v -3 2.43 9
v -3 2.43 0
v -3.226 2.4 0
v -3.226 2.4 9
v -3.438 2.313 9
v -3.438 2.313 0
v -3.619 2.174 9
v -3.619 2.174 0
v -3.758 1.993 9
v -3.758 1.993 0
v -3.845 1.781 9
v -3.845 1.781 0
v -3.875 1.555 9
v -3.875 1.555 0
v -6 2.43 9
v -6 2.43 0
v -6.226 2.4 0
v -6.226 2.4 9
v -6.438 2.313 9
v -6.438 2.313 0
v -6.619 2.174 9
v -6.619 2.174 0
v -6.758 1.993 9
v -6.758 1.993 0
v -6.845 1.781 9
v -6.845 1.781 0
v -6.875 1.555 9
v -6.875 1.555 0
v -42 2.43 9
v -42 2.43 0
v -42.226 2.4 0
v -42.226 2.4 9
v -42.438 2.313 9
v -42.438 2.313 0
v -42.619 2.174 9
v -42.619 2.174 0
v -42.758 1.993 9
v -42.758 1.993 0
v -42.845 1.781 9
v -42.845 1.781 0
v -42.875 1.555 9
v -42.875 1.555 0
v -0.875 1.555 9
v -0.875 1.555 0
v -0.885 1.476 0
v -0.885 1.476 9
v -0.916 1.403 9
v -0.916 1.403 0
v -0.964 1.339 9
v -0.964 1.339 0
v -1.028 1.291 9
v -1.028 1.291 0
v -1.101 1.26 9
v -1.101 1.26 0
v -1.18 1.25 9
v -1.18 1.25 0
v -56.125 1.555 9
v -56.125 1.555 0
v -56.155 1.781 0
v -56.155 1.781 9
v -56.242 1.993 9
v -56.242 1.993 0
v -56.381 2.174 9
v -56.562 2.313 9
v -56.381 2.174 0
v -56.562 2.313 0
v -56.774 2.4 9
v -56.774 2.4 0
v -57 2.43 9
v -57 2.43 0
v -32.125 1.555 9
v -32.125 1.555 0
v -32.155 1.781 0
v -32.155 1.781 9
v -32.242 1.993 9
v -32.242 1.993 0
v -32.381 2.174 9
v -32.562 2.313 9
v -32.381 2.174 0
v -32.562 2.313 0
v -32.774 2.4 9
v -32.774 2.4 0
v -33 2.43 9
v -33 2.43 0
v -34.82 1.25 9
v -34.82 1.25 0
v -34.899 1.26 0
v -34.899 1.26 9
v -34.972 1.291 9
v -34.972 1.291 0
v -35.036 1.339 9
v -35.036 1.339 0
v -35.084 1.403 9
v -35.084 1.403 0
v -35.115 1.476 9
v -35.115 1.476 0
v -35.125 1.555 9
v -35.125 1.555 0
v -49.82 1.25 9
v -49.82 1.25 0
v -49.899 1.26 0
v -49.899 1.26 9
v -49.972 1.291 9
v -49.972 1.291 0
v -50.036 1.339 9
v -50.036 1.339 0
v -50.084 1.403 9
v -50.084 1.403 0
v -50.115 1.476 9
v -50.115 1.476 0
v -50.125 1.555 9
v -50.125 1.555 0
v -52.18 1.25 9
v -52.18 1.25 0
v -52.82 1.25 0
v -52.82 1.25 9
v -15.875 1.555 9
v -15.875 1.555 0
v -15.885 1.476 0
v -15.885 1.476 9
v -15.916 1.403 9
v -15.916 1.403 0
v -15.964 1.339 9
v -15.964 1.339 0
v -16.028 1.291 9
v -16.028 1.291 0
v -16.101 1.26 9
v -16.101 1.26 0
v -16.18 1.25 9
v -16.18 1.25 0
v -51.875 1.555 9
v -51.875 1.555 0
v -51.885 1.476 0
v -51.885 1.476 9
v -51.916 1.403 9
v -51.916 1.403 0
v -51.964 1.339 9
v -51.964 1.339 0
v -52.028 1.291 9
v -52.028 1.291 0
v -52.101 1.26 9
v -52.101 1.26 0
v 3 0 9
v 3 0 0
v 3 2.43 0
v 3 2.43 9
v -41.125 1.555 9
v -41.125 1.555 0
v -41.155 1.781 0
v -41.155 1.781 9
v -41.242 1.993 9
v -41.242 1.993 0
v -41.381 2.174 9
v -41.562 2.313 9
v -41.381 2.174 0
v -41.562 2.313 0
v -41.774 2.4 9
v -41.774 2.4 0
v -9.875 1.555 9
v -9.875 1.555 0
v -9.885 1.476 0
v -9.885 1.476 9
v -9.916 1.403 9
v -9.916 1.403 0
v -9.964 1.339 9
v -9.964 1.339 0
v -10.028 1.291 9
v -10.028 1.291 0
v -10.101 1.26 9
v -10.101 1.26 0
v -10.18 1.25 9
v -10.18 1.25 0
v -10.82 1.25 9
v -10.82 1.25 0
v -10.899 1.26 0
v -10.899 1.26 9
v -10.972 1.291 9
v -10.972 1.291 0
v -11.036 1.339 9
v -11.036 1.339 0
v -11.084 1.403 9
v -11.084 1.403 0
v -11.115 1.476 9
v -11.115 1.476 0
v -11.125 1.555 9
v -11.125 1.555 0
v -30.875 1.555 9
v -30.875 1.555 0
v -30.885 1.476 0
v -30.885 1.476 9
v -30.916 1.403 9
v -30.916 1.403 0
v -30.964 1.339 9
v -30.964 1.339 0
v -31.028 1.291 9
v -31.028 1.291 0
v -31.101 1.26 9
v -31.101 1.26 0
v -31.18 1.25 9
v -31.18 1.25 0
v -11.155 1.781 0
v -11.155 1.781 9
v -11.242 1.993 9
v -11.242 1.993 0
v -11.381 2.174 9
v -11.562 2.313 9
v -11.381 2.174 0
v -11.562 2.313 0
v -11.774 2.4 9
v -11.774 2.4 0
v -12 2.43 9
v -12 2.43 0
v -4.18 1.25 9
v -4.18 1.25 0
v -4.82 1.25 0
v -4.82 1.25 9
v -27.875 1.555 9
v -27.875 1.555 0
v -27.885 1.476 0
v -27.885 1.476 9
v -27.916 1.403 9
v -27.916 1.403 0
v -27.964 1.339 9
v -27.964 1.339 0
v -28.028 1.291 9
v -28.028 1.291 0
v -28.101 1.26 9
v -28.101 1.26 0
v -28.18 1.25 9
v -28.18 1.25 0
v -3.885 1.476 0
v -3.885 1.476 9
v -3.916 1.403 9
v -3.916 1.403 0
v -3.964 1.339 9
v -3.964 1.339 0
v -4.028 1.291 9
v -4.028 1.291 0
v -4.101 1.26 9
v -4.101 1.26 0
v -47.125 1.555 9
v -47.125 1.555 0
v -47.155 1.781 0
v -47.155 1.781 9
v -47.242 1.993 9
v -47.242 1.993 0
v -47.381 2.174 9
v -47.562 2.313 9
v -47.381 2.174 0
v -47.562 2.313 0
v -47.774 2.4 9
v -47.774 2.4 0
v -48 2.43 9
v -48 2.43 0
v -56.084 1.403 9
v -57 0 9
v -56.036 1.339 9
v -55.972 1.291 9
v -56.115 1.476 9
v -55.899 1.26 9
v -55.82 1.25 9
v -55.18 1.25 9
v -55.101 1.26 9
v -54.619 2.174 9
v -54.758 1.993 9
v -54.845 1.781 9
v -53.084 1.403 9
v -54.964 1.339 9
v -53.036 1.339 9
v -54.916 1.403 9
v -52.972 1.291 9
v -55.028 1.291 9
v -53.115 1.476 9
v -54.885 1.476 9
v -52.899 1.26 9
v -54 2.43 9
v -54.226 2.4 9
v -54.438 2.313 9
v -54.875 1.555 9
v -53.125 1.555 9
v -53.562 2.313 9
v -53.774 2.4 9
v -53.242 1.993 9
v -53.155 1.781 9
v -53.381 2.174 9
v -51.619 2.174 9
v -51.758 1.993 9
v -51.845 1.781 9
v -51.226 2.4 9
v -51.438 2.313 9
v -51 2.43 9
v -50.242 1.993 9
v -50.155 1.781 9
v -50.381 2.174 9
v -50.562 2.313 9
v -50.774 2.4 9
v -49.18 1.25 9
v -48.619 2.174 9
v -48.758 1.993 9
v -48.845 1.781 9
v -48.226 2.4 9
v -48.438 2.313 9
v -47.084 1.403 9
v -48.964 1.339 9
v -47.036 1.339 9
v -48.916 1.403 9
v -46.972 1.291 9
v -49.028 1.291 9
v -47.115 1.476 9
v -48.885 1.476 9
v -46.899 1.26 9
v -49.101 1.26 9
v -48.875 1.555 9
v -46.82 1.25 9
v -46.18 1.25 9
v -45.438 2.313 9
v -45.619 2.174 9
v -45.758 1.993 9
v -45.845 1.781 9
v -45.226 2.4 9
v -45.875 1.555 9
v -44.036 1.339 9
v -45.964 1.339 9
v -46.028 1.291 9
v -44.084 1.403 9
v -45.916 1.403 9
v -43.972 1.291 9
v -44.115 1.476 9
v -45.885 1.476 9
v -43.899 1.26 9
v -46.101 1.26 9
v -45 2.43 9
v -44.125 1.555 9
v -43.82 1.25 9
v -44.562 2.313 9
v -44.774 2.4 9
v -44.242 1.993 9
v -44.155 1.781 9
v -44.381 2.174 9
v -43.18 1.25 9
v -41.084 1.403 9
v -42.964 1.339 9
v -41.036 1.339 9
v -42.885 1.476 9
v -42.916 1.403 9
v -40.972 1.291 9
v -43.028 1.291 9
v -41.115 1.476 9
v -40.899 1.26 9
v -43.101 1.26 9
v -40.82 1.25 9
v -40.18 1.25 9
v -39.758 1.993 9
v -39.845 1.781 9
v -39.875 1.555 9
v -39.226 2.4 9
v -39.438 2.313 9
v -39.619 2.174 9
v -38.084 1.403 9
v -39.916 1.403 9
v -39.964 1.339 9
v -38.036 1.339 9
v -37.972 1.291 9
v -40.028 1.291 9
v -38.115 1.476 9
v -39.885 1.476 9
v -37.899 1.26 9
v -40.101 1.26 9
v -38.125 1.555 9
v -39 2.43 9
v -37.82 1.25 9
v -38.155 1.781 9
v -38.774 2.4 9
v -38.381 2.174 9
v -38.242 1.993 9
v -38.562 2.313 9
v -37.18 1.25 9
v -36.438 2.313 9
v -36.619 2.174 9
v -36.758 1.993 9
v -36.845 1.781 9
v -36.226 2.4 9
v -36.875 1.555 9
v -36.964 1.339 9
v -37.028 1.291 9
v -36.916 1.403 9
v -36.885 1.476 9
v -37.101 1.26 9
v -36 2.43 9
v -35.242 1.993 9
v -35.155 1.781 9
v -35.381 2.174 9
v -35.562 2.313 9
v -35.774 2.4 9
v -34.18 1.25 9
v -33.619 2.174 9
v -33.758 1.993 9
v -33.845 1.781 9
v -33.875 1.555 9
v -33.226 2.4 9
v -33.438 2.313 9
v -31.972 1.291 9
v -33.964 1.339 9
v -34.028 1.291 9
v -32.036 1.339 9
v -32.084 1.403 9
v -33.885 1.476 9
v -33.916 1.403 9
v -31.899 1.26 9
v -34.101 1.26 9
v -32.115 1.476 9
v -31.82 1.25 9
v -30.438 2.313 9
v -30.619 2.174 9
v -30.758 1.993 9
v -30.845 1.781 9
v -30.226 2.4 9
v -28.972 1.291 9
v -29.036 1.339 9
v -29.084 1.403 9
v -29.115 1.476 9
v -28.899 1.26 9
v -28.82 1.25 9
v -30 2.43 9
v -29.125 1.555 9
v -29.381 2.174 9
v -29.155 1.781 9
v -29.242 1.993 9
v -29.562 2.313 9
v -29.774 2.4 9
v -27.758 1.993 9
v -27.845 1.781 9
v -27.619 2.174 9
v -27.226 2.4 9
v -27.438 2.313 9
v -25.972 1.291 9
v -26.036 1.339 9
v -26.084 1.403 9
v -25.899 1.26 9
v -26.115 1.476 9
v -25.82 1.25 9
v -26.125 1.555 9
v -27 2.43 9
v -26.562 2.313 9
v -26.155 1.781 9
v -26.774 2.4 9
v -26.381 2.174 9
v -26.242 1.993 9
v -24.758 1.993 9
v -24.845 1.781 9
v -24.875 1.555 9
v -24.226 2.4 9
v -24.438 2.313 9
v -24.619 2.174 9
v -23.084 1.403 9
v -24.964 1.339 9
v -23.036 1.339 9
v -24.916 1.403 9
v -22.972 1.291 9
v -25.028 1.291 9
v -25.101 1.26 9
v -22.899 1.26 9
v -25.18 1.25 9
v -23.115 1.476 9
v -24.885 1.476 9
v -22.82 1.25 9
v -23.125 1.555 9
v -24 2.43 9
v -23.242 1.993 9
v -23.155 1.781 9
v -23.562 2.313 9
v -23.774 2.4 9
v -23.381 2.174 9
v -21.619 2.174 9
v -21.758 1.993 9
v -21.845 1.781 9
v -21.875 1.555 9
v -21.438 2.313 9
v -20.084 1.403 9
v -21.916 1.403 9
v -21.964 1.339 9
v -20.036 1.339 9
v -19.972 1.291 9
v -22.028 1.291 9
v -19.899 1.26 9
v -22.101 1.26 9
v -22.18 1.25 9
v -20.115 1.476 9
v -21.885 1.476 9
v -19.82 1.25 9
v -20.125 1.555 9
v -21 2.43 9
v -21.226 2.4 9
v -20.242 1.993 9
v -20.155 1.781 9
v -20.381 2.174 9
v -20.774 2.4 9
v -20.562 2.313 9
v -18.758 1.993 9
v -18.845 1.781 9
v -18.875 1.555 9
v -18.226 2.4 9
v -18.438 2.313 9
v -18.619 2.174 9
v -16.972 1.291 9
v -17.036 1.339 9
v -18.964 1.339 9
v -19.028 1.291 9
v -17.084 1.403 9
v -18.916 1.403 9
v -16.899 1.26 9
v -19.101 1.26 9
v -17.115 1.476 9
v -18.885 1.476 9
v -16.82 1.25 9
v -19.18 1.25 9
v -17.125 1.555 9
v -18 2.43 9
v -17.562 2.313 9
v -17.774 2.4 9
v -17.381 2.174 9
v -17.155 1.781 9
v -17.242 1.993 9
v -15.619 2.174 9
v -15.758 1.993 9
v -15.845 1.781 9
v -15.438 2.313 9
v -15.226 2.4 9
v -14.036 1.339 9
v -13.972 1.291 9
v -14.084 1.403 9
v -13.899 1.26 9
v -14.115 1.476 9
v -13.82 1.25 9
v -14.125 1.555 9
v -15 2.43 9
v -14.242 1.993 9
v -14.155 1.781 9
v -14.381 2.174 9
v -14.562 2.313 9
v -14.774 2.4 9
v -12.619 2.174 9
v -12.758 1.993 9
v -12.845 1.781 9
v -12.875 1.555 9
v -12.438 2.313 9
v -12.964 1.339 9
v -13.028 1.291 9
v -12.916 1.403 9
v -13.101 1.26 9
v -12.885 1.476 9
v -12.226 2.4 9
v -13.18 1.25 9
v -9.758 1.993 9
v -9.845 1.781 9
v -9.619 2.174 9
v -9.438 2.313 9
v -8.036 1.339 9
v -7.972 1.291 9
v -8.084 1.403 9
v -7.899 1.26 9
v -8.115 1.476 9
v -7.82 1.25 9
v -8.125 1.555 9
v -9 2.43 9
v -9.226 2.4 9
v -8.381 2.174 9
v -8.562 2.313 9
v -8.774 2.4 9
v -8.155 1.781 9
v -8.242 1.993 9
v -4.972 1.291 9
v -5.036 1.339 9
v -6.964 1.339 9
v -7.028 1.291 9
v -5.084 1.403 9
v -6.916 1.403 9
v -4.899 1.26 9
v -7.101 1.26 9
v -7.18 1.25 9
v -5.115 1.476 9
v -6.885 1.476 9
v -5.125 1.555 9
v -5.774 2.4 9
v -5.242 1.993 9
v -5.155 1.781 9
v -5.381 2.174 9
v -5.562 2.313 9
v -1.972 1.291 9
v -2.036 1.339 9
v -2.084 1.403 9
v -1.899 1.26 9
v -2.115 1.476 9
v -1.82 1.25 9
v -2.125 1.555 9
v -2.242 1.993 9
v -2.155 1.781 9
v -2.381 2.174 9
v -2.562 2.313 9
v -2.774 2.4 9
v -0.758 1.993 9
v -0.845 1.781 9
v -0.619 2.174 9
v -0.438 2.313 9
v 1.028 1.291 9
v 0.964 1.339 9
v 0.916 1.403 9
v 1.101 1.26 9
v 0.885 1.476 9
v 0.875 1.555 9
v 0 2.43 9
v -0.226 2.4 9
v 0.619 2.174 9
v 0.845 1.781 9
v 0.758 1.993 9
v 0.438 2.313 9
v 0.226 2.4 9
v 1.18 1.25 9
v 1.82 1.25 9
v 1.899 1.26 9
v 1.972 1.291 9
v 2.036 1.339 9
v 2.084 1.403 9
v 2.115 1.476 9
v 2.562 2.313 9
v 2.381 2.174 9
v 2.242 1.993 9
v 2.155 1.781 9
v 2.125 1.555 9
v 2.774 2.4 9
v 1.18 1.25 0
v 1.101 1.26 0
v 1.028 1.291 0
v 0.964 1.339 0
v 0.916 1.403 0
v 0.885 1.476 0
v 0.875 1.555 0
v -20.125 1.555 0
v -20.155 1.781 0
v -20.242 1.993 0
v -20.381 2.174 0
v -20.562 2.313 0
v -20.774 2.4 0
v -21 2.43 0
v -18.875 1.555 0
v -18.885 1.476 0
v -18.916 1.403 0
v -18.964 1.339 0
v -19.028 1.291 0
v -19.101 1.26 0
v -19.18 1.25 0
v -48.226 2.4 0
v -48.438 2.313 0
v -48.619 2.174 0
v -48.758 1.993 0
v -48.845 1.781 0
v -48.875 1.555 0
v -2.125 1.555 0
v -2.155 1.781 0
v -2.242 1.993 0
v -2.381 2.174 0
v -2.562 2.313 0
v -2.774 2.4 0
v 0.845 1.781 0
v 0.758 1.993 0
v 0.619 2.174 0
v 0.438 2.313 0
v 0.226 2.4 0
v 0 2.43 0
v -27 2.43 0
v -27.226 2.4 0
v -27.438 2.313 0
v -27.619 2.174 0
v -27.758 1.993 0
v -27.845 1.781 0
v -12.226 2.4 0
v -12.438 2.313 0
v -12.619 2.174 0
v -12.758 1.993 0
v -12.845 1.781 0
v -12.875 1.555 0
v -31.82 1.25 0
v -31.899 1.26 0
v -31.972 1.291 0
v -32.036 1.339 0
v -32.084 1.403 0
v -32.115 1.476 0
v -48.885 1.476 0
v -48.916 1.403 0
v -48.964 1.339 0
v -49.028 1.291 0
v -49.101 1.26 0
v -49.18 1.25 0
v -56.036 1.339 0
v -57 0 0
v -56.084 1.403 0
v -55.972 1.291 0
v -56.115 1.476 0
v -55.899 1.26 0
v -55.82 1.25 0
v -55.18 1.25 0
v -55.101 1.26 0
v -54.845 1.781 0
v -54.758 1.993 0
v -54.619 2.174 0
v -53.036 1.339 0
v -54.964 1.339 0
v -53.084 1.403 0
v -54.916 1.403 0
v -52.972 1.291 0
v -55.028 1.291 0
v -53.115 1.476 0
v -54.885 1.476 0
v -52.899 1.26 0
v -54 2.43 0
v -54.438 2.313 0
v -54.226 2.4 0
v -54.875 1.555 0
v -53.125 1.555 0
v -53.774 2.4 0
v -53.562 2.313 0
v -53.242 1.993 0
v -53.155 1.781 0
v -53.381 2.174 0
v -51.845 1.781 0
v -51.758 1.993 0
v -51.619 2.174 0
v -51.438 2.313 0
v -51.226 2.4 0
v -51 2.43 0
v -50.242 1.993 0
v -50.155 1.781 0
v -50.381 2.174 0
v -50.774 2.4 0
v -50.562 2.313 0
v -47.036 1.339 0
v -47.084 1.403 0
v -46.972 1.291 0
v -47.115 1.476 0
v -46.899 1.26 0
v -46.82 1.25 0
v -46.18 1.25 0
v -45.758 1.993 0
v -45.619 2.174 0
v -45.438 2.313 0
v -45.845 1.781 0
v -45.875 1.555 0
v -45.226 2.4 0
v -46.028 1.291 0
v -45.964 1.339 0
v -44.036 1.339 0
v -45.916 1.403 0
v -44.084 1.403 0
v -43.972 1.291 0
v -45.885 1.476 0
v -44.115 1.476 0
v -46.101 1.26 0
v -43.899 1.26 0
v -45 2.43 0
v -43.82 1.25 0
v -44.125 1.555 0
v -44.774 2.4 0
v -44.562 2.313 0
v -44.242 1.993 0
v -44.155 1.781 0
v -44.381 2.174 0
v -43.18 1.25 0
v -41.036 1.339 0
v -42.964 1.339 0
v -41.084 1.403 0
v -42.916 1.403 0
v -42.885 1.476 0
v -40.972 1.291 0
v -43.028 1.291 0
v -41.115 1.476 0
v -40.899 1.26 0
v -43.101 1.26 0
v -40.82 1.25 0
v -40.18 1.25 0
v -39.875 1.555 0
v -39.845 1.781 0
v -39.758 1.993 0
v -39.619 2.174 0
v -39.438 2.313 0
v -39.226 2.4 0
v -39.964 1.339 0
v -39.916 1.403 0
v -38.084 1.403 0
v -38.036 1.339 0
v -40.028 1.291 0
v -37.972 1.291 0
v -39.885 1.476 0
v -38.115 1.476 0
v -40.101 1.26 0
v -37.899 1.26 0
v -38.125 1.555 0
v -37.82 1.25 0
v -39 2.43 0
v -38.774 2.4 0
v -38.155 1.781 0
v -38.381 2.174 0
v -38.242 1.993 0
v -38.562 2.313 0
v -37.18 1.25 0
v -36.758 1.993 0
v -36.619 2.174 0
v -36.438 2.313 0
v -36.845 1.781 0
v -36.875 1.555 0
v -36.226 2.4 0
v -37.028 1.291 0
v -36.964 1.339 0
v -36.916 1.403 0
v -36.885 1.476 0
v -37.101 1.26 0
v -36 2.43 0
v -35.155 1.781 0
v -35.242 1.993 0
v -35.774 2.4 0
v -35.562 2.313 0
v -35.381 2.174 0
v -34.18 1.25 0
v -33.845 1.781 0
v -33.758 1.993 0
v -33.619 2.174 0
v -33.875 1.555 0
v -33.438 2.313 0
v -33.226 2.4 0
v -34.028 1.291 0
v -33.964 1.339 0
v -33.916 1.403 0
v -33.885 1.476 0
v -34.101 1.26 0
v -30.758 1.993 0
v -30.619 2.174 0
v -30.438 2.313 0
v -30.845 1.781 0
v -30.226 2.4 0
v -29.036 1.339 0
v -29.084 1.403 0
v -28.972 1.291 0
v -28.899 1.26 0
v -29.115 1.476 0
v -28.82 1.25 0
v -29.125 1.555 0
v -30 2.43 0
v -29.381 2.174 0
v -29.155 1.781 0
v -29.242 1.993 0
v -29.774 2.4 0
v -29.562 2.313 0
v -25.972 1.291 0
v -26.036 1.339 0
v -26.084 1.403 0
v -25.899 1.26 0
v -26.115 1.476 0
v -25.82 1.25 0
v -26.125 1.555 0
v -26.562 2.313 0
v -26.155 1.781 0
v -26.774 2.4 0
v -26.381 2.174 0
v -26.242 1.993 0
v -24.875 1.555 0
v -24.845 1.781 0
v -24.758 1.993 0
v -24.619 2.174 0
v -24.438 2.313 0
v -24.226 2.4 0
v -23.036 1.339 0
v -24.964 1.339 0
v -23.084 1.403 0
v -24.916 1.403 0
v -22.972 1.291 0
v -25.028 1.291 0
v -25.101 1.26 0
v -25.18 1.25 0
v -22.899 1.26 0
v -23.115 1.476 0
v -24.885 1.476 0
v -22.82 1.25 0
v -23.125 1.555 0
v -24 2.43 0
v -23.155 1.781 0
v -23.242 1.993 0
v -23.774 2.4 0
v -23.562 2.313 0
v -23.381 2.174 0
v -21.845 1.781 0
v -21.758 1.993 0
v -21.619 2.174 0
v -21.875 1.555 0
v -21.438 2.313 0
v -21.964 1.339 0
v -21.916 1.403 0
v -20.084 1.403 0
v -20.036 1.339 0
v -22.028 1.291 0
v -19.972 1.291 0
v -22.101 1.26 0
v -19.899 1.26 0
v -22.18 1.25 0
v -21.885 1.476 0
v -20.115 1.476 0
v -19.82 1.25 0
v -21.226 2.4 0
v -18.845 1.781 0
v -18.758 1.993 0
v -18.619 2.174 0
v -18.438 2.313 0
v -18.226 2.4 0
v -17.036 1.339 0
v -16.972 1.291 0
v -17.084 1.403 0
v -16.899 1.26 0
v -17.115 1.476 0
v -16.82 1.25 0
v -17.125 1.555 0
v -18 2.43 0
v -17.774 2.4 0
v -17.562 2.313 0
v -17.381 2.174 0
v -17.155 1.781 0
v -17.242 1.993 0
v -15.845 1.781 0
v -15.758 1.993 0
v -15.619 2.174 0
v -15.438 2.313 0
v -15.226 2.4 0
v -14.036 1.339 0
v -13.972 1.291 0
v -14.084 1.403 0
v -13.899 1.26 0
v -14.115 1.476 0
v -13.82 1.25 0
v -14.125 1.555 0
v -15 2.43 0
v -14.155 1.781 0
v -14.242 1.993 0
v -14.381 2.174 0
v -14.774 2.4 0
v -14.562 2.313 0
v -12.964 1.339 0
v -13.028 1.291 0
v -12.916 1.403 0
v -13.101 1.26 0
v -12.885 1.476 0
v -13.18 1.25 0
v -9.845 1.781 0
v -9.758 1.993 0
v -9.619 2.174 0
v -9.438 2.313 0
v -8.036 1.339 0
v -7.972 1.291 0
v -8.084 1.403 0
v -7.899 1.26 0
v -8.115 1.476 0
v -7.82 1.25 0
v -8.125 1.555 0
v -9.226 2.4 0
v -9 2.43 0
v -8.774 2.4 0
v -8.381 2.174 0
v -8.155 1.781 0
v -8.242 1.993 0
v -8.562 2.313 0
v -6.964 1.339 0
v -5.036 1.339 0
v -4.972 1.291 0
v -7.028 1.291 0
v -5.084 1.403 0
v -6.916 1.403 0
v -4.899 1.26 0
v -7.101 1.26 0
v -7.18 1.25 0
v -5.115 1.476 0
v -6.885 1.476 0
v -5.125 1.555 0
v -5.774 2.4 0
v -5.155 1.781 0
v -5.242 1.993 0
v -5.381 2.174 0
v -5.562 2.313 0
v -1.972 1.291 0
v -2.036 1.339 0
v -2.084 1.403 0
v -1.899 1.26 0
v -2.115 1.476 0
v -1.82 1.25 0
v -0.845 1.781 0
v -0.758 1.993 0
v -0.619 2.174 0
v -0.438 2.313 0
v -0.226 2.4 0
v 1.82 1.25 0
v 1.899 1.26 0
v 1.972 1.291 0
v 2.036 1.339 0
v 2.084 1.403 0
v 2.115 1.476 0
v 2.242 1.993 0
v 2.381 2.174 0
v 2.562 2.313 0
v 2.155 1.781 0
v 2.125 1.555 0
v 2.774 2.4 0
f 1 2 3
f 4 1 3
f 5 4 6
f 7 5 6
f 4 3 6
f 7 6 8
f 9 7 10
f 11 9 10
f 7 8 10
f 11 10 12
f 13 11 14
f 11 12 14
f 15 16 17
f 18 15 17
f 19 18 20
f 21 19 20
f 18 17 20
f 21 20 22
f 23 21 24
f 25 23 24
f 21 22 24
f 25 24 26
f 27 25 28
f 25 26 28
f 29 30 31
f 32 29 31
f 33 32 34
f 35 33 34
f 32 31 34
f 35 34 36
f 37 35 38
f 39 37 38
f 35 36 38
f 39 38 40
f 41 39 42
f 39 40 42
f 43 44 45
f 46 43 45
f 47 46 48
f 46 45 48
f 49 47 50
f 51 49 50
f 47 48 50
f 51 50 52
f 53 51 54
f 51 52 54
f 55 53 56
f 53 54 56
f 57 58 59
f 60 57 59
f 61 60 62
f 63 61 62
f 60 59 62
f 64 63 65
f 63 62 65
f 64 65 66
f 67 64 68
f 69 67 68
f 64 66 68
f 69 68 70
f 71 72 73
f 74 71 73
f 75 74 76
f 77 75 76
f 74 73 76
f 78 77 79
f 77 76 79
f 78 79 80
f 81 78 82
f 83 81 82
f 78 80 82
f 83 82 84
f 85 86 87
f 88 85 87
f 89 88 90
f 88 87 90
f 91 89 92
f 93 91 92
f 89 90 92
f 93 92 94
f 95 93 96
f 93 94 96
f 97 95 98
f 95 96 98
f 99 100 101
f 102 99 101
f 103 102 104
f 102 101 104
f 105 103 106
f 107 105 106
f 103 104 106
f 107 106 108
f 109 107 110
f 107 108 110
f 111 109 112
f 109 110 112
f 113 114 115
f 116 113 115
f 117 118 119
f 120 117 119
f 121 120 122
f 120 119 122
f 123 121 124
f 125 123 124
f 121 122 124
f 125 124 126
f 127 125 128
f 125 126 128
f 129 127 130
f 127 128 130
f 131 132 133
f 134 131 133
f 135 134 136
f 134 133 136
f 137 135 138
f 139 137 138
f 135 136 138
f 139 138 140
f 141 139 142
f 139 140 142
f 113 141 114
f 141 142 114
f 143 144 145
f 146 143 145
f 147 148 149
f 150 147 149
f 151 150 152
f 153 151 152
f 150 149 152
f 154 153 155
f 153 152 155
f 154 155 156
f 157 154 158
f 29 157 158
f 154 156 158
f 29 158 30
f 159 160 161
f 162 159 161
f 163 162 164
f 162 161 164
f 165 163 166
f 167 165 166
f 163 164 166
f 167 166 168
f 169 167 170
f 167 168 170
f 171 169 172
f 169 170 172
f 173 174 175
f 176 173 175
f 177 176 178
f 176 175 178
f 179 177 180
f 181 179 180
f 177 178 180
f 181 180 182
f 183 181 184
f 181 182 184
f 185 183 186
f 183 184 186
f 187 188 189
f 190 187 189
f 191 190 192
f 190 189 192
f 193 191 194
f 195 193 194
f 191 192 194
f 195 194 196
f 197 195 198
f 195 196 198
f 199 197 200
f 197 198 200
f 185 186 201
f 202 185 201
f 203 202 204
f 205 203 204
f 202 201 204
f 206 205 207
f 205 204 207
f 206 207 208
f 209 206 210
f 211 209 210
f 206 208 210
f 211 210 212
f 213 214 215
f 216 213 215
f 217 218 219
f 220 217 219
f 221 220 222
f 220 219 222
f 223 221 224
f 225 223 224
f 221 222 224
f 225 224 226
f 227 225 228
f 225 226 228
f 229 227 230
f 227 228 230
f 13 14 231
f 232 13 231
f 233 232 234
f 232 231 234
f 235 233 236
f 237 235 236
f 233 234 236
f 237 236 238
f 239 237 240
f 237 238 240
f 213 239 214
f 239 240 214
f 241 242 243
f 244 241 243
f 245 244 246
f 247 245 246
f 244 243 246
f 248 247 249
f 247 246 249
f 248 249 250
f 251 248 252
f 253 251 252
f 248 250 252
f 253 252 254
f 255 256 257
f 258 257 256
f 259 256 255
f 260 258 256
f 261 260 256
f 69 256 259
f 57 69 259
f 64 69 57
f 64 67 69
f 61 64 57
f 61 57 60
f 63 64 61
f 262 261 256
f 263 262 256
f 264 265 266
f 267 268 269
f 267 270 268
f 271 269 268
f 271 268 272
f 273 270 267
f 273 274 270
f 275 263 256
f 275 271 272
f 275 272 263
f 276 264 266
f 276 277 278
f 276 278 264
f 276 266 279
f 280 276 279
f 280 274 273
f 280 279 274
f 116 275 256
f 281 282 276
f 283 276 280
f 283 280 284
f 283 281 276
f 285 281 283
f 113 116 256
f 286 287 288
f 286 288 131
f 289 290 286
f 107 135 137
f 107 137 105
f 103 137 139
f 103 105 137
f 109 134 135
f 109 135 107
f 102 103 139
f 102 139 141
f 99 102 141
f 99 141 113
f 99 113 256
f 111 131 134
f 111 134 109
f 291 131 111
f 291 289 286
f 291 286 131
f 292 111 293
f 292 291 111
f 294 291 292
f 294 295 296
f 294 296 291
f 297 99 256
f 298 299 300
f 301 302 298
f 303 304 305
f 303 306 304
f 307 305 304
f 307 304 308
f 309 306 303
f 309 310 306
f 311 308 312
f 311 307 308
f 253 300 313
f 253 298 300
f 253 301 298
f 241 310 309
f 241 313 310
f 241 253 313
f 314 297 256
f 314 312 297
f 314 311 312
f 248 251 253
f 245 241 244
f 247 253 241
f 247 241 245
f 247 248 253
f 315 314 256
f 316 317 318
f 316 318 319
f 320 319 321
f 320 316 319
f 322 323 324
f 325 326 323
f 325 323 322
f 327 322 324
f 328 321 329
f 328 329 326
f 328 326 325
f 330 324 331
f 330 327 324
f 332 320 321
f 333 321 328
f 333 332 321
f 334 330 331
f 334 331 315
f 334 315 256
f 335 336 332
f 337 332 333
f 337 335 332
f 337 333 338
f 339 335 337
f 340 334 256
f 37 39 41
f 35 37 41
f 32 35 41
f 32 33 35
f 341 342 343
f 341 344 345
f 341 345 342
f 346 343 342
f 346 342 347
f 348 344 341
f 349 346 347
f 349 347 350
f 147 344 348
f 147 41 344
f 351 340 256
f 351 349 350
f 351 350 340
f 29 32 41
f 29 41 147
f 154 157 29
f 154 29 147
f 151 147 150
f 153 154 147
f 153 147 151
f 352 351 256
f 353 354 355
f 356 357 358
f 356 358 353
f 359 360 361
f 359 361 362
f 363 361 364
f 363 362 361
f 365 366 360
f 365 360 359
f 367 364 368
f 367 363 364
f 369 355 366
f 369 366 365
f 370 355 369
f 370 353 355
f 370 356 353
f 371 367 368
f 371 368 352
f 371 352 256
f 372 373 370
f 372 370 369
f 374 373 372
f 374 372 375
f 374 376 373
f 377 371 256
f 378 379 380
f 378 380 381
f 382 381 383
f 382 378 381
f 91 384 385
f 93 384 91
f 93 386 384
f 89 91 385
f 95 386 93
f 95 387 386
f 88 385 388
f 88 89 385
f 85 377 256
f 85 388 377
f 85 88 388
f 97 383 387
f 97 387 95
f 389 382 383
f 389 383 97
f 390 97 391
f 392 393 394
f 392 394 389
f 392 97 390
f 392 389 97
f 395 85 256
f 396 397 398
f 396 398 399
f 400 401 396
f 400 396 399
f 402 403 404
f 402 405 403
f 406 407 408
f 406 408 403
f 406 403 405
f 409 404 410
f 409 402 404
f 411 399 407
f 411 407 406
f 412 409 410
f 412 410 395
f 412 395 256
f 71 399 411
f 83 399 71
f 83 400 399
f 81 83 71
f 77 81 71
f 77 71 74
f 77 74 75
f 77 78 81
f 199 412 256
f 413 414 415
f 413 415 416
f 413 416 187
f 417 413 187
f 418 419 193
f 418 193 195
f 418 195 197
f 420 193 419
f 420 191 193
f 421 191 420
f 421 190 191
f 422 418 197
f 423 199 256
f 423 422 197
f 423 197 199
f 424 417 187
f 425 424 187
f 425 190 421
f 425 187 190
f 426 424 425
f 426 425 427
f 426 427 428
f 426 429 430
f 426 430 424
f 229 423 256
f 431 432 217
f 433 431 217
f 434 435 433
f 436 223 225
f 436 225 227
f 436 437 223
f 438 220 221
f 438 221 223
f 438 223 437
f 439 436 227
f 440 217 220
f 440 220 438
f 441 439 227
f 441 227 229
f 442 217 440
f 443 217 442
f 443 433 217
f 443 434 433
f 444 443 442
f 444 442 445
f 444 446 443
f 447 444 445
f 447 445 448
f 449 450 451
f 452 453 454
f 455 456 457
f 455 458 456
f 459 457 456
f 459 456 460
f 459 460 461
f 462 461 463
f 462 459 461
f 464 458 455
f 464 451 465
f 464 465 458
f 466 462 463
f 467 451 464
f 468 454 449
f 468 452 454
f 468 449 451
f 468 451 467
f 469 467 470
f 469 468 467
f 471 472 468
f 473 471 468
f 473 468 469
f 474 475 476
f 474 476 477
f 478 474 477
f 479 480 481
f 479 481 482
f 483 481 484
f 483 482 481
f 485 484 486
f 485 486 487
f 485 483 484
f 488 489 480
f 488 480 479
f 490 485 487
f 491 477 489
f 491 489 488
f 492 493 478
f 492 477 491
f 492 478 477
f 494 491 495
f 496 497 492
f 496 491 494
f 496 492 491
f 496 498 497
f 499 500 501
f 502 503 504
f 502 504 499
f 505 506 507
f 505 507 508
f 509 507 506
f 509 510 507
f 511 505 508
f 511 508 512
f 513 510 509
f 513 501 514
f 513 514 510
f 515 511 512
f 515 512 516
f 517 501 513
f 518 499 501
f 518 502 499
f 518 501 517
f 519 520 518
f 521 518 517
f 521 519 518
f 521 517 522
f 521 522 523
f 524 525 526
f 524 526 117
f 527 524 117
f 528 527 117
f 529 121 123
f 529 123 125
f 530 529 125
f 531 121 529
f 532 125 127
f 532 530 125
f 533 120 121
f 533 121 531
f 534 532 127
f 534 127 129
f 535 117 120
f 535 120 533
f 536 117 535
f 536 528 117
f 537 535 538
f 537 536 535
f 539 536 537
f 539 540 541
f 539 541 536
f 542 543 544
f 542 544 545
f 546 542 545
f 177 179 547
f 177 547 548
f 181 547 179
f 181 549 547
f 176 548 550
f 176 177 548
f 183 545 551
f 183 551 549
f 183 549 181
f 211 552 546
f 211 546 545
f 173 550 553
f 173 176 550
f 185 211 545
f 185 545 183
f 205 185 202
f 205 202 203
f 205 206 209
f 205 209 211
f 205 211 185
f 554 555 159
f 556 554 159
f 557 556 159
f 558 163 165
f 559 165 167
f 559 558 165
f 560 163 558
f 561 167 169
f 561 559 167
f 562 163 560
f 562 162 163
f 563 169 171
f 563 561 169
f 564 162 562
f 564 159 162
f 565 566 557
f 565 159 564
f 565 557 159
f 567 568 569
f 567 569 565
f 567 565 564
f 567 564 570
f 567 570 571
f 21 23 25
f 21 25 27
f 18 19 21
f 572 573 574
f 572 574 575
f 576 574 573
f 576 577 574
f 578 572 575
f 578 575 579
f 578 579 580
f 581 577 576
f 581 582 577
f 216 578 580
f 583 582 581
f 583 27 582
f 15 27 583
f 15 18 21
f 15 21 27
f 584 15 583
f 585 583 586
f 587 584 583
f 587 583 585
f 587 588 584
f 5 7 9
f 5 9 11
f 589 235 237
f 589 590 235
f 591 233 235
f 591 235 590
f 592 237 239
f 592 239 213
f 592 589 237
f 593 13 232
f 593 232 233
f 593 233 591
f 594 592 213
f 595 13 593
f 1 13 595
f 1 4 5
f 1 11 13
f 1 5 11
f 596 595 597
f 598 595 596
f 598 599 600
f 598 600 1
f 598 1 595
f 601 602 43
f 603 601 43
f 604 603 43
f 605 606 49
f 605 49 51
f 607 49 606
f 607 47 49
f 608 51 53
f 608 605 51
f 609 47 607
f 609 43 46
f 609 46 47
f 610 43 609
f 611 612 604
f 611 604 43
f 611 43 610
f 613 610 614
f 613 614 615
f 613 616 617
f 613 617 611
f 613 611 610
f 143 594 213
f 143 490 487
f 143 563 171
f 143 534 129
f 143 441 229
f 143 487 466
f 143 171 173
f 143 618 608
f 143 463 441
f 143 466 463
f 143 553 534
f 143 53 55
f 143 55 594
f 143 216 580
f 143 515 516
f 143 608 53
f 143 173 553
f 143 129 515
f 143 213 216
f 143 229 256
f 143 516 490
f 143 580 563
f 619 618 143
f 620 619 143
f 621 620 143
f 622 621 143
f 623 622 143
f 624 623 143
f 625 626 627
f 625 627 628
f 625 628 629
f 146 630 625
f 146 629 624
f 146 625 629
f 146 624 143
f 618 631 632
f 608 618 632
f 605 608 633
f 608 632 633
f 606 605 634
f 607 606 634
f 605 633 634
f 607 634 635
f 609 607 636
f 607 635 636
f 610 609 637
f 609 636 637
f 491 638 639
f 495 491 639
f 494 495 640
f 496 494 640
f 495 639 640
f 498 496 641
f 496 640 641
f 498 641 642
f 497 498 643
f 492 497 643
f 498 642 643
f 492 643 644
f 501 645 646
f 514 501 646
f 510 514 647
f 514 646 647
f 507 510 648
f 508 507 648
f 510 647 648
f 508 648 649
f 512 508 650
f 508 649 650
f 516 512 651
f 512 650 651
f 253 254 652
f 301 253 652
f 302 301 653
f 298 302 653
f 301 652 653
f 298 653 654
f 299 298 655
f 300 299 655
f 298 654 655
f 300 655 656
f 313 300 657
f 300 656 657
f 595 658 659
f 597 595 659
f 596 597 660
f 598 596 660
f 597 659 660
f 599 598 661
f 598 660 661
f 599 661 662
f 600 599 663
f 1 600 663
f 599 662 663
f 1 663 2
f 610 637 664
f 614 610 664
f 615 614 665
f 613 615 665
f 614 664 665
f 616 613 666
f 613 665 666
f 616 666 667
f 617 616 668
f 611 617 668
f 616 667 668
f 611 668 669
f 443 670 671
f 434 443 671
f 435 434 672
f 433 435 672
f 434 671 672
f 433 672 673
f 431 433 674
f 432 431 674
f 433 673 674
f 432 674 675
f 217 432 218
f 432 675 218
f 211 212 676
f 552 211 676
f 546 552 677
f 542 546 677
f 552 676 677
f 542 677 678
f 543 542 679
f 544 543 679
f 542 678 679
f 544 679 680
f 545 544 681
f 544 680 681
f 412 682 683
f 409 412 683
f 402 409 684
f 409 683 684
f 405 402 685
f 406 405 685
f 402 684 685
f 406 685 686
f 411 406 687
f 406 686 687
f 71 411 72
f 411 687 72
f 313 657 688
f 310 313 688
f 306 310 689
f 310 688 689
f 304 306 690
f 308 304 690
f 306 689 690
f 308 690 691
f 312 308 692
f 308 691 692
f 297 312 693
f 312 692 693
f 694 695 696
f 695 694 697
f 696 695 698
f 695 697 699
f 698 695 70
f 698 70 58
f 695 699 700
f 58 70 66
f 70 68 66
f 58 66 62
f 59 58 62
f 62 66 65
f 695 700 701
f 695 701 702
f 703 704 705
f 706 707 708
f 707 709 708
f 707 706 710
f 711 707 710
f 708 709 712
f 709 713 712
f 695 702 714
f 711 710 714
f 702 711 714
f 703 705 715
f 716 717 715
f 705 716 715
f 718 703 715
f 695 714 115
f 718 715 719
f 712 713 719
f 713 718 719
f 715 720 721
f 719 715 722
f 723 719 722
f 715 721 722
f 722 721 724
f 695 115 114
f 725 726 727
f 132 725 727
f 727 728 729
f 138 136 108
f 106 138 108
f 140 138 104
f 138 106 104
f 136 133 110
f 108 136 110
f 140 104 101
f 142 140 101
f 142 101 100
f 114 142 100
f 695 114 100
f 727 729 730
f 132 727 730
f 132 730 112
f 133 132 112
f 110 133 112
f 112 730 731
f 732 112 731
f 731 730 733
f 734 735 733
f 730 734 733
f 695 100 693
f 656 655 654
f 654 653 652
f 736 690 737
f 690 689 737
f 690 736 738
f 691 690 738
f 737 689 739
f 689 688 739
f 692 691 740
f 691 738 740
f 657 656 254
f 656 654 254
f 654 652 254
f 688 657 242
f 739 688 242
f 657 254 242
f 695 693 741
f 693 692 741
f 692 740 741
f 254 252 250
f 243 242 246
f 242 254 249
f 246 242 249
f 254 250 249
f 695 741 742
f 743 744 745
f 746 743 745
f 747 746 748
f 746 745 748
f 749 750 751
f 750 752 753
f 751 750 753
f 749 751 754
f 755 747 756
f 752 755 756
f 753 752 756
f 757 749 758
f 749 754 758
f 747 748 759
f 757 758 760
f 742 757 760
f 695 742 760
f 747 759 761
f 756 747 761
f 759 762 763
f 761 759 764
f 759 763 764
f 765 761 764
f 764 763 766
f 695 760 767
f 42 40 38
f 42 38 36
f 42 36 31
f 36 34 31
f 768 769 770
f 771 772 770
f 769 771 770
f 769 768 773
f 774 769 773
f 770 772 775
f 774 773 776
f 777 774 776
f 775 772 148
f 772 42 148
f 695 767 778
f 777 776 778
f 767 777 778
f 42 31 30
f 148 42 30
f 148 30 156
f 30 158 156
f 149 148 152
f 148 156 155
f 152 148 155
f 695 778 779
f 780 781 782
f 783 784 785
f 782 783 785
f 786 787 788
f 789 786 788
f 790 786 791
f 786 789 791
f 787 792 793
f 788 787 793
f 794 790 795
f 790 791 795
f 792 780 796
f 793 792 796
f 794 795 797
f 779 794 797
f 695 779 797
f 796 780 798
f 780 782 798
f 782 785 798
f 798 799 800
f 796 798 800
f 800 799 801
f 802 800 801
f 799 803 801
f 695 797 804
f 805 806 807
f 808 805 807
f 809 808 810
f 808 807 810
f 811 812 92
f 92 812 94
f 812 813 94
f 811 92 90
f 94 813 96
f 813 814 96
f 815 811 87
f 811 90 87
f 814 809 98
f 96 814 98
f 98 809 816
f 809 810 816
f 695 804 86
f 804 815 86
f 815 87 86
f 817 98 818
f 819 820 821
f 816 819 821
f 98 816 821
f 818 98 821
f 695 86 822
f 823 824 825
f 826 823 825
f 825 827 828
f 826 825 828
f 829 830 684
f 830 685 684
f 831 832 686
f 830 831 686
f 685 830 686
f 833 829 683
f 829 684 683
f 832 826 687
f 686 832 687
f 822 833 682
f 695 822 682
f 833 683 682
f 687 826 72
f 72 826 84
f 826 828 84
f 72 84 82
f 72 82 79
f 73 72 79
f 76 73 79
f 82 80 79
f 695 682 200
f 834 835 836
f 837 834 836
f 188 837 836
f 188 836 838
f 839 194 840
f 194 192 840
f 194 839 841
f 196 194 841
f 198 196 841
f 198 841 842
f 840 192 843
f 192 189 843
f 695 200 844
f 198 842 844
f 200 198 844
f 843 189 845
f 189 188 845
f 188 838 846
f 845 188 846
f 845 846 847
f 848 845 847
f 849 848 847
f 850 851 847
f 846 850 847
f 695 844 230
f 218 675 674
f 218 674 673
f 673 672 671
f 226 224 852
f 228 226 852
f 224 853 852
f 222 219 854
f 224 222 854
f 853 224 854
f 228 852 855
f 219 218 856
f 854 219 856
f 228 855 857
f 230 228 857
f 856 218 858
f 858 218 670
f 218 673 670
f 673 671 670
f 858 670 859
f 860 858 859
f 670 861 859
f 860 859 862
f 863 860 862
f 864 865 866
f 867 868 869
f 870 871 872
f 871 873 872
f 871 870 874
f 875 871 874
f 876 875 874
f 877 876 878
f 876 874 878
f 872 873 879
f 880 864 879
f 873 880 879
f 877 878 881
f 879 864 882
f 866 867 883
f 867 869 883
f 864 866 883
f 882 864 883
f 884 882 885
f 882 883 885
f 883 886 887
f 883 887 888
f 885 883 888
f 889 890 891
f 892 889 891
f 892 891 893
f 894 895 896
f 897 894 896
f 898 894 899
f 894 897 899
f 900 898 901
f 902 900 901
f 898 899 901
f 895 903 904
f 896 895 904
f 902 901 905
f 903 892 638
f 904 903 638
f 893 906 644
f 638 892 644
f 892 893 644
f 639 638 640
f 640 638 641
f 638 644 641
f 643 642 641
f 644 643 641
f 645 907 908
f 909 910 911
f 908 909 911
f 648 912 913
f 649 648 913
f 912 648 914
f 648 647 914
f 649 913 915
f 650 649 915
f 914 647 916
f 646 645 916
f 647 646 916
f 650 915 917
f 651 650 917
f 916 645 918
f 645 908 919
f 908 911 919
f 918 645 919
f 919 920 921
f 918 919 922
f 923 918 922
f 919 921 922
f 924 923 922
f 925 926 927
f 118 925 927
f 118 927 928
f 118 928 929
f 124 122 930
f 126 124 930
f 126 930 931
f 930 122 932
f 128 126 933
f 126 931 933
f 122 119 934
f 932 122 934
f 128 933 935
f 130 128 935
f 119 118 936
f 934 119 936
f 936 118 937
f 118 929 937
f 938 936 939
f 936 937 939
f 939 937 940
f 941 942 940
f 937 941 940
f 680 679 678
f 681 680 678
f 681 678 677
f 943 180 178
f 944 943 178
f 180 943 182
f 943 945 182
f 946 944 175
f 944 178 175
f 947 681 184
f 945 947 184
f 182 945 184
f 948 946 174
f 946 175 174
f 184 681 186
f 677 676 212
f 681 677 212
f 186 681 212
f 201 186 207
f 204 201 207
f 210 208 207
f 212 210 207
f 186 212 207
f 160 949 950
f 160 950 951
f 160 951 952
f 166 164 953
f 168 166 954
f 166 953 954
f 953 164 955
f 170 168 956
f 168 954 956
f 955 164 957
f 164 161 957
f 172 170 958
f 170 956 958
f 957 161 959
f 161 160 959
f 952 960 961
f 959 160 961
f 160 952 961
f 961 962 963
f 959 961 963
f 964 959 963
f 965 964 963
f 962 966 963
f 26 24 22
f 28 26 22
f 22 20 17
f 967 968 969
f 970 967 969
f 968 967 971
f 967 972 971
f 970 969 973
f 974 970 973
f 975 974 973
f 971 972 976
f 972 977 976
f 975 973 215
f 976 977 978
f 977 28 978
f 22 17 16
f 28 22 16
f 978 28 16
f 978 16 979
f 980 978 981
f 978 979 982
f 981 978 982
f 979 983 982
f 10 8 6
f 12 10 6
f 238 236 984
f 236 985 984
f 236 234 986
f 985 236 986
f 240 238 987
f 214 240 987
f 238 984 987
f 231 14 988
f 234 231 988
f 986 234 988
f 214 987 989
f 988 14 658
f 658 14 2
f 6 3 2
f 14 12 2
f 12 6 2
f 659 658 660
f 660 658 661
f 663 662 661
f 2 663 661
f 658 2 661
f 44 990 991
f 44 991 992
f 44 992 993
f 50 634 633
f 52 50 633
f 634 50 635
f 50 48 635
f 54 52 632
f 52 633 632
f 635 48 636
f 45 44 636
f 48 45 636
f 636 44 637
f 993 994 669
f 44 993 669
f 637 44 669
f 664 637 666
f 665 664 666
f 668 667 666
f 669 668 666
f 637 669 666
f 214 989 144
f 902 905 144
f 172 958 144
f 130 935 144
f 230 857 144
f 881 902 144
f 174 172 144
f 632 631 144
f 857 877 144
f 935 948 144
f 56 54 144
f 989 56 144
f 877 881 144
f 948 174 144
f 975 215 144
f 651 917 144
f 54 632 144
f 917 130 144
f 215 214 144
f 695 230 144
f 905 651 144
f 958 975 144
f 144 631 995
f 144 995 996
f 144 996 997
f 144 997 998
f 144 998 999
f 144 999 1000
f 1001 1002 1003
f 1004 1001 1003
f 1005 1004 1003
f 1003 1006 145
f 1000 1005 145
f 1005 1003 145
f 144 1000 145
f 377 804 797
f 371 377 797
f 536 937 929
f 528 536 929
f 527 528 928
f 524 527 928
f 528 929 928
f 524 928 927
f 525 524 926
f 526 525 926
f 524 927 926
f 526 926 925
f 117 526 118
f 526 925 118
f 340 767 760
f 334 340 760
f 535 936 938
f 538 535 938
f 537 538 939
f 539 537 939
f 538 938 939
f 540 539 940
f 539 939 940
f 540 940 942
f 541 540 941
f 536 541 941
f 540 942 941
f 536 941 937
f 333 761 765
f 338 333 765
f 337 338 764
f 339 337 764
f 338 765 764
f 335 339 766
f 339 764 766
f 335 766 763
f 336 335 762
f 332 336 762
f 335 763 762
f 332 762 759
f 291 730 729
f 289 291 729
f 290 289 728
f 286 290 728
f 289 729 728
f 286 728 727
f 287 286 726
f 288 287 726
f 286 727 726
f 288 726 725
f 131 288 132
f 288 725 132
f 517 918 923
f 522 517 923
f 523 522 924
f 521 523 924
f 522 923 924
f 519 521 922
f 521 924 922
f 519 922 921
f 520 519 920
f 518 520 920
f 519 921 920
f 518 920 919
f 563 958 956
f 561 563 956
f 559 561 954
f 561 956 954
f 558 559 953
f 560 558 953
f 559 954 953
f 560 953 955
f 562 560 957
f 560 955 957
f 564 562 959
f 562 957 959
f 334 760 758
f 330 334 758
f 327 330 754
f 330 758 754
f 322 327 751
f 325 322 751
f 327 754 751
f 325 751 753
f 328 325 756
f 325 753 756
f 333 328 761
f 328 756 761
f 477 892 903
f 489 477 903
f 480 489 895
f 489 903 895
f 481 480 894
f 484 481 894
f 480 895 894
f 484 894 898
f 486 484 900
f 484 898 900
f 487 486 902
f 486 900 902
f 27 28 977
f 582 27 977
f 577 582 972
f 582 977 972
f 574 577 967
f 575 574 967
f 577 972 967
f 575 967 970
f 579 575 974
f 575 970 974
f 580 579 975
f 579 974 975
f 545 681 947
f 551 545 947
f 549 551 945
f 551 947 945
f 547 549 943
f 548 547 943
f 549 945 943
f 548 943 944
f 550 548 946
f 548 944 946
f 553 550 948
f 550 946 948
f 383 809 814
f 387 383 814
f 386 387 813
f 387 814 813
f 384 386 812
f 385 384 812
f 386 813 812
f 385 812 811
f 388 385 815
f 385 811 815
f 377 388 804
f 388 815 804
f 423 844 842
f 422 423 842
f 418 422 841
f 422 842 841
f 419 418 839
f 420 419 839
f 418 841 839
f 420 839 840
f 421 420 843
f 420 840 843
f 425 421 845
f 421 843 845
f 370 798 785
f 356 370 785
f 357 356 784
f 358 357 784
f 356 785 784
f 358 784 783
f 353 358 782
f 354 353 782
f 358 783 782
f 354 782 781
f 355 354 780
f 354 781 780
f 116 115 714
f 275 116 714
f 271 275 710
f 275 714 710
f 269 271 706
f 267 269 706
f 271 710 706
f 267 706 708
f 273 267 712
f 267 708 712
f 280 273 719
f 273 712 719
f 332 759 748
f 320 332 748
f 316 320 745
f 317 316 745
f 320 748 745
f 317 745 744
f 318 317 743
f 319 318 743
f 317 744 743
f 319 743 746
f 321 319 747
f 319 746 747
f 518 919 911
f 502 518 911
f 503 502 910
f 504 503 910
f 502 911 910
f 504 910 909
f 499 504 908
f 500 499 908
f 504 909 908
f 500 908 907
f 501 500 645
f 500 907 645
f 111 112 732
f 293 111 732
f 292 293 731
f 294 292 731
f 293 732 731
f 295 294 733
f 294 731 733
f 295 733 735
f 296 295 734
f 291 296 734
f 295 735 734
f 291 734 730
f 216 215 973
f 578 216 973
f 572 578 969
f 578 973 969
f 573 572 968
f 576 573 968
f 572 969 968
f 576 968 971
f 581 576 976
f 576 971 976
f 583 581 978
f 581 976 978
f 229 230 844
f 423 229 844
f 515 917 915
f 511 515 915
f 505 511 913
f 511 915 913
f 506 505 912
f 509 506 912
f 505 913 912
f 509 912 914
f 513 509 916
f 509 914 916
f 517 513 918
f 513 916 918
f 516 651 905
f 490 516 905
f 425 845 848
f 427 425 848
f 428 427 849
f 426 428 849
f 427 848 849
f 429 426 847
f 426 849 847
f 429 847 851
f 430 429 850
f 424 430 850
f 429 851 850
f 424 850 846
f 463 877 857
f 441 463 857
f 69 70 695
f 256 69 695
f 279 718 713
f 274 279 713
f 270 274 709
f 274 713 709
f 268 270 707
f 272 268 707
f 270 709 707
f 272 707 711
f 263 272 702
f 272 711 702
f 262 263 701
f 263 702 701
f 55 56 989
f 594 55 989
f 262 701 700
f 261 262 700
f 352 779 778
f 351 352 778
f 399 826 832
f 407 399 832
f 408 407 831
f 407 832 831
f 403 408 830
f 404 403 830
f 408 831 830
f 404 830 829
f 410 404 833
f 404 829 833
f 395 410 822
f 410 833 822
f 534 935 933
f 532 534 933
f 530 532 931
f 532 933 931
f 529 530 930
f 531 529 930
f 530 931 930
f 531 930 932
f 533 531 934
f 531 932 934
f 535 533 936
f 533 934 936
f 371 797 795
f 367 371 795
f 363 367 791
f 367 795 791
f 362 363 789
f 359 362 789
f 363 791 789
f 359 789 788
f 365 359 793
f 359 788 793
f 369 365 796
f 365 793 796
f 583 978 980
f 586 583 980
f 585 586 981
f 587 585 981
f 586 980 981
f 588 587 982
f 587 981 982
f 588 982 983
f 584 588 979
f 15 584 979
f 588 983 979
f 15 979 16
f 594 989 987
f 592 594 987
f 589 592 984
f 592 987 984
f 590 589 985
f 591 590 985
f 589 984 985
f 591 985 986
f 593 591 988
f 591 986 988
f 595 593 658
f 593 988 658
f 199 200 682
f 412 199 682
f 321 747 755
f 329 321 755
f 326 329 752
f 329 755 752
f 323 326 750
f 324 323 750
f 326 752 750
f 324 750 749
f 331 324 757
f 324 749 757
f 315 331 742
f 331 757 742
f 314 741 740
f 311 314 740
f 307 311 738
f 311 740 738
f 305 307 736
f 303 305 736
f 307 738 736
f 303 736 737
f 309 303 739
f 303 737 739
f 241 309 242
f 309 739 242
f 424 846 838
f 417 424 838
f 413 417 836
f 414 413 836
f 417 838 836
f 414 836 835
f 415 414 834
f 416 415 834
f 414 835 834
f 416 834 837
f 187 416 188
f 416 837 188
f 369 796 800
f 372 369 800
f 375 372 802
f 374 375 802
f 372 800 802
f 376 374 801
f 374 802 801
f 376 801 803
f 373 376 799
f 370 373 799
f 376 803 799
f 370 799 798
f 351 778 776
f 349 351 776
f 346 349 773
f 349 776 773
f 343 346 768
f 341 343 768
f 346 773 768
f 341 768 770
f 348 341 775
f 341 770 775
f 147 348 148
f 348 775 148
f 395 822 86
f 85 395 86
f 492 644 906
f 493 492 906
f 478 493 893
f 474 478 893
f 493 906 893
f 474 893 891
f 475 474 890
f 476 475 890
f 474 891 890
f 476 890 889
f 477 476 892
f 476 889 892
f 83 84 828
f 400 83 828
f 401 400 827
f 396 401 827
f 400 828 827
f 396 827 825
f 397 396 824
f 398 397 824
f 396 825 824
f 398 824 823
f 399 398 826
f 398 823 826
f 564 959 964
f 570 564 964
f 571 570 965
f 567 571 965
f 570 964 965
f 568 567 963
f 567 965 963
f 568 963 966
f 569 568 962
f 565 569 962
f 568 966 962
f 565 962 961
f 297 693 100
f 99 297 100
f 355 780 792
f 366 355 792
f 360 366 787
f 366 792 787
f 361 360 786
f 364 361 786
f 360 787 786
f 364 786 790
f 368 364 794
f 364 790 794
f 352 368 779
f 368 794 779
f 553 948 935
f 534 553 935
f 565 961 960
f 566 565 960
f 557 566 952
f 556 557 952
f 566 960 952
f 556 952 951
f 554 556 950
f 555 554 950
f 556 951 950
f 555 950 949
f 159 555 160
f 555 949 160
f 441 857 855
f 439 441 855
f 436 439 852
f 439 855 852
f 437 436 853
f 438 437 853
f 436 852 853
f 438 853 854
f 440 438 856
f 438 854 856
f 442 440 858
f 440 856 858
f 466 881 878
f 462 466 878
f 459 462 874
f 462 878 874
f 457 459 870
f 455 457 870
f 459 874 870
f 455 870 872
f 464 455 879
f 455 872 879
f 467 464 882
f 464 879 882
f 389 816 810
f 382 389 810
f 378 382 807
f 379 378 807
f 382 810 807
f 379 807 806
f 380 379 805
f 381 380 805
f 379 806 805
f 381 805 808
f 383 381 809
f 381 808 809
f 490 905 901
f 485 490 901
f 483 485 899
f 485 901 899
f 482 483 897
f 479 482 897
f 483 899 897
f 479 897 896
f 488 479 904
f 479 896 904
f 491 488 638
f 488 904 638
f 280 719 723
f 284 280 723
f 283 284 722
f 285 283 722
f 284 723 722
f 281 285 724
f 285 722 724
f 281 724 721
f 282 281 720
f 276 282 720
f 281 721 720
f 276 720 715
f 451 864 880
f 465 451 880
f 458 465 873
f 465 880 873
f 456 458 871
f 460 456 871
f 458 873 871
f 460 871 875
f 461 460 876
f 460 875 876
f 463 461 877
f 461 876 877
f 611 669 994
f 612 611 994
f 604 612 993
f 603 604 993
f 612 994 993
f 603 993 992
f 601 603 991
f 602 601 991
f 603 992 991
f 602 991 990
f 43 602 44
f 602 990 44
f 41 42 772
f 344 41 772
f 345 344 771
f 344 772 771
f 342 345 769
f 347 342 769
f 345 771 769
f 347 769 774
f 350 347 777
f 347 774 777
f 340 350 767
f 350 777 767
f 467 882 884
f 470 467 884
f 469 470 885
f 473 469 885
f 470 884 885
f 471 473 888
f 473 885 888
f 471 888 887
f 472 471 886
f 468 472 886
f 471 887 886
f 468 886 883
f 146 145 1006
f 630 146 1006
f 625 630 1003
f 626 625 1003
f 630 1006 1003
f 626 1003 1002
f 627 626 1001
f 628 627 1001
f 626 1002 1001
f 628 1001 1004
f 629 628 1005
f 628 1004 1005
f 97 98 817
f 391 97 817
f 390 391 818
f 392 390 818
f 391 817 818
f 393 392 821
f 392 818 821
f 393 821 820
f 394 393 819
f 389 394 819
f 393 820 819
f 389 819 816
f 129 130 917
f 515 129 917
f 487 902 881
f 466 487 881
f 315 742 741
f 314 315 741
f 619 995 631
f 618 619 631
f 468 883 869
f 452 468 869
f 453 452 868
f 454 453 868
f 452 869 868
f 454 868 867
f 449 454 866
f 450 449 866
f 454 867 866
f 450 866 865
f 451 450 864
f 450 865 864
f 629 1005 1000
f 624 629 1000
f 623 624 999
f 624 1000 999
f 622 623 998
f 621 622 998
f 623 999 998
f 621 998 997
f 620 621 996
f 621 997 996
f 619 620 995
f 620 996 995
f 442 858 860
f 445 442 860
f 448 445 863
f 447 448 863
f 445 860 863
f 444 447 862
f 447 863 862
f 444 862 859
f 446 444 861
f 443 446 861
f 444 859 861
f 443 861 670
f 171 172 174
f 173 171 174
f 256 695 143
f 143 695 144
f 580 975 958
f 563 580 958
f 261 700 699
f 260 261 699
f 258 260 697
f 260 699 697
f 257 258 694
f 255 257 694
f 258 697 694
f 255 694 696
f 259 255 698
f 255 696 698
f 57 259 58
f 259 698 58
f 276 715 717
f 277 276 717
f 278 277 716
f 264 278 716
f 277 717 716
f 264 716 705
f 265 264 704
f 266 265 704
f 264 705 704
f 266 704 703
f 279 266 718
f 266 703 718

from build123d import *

# Parameters (mm, degrees)
BOSS_EXTRUDE1_DEPTH = 9
LPATTERN1_COUNT     = 20
LPATTERN1_PITCH     = 3


with BuildPart() as part:
    # Sketch1 → Boss-Extrude1 (new body)
    with BuildSketch(Plane.XY):
        with BuildLine():
            Line((0, 0), (3, 0))
            Line((3, 0), (3, 2.43))
            ThreePointArc((3, 2.43), (2.381281566, 2.173718434), (2.125, 1.555))
            ThreePointArc((2.125, 1.555), (2.035667568, 1.339332432), (1.82, 1.25))
            Line((1.82, 1.25), (1.18, 1.25))
            ThreePointArc((1.18, 1.25), (0.964332432, 1.339332432), (0.875, 1.555))
            ThreePointArc((0.875, 1.555), (0.618718434, 2.173718434), (0, 2.43))
            Line((0, 2.43), (0, 1.25))
            Line((0, 1.25), (0, 0))
        make_face()
    boss_extrude1 = extrude(amount=BOSS_EXTRUDE1_DEPTH)

    # LPattern1: Boss-Extrude1 ×20
    with Locations(*[(-i * LPATTERN1_PITCH, 0, 0) for i in range(1, LPATTERN1_COUNT)]):
        add(boss_extrude1)


solid = part.part
